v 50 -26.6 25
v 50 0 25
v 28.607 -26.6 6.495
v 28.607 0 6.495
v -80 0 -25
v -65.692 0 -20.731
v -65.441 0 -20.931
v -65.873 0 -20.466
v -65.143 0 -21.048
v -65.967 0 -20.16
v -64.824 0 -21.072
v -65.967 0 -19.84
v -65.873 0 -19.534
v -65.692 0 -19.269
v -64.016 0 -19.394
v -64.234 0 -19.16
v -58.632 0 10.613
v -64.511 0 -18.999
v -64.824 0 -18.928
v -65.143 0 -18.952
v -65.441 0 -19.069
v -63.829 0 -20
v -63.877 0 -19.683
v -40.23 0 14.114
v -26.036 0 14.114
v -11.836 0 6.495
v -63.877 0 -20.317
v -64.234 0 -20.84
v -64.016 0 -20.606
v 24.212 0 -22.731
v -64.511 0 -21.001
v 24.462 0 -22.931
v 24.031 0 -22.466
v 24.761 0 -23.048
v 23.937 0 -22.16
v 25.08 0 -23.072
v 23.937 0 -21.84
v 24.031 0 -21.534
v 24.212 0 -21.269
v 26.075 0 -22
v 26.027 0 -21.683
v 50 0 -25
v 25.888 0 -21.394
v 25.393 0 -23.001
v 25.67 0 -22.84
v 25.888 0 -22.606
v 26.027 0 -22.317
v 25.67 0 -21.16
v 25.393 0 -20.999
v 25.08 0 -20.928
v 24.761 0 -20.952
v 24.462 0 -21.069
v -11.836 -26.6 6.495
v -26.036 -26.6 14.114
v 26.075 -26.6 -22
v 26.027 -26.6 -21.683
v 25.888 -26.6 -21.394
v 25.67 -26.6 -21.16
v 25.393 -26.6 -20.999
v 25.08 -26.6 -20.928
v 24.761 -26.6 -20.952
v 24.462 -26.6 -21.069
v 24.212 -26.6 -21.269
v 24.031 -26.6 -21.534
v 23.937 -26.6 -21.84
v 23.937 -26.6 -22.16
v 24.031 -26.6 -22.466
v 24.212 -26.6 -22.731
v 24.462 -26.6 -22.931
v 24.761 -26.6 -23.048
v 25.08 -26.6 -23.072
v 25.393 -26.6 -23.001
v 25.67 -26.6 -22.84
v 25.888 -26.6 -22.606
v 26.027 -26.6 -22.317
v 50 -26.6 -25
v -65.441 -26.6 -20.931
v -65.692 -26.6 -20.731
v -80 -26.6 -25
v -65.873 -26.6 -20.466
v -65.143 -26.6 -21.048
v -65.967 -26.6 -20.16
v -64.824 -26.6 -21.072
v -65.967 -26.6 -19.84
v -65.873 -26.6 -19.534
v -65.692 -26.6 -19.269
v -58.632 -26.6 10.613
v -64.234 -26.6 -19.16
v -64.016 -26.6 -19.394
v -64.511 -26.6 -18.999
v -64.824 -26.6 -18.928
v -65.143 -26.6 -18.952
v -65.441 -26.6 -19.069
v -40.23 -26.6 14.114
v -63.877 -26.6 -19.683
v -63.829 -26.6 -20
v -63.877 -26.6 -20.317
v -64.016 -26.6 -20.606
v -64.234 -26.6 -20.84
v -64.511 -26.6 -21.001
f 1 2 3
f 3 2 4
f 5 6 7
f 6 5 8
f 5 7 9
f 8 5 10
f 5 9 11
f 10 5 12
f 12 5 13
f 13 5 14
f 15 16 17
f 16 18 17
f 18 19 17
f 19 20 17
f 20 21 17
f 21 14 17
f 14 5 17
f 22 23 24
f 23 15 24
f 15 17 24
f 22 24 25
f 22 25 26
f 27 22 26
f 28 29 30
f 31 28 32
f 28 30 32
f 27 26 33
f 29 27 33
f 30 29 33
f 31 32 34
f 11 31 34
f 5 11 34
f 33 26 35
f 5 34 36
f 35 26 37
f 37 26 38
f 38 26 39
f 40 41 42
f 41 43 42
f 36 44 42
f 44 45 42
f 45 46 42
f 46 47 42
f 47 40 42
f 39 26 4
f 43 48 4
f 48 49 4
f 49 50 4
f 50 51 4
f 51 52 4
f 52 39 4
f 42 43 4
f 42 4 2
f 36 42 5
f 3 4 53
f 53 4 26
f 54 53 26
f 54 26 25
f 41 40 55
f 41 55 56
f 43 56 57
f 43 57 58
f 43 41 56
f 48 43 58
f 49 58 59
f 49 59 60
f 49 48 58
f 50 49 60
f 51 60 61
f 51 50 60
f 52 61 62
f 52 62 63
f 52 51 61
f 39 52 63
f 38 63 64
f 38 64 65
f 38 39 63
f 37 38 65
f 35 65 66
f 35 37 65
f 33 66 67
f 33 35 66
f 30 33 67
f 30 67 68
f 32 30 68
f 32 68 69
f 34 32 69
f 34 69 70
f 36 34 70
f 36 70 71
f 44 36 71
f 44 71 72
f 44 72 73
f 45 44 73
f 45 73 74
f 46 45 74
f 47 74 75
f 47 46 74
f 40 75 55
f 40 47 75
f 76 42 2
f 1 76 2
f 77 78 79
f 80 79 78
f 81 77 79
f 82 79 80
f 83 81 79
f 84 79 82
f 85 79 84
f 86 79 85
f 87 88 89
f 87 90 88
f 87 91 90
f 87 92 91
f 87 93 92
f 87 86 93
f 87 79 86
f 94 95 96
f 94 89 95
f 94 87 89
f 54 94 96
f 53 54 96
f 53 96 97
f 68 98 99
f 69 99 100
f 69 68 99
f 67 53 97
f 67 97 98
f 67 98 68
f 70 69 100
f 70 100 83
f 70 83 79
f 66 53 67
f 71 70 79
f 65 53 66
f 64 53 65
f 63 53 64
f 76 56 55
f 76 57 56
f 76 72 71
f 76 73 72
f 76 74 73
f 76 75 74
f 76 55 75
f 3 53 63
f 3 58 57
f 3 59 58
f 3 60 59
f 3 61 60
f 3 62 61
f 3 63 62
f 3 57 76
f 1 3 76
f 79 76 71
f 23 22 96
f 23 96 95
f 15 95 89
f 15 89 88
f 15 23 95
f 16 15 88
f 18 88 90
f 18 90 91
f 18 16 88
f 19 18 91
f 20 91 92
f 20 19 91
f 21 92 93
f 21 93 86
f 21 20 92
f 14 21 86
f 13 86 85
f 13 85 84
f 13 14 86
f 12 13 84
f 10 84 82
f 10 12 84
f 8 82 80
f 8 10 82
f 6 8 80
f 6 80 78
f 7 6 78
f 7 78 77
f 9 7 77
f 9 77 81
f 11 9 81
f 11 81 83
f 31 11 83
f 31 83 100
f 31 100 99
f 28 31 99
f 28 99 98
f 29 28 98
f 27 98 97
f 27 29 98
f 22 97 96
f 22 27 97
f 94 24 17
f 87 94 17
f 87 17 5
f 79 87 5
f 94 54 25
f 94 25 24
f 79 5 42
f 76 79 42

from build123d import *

# Parameters (mm, degrees)
F0_R     = 1.075
F1_DEPTH = 26.6
F2_DEPTH = 158
F4_DEPTH = 26.601


# Not quite as in the source:
# - an extrude ends at something that could not be found from the text; its depth is read off the source's solid


with BuildPart() as f1:
    # F0 (on Front) → F1 (new body)
    with BuildSketch(Plane.XZ):
        Polygon((50, 25), (-50, 25), (-80, -25), (-50, -25), (25, -25), (50, -25), align=None)
        with Locations((-64.9039745331, -20)):
            Circle(F0_R, mode=Mode.SUBTRACT)
        with Locations((25, -22)):
            Circle(F0_R, mode=Mode.SUBTRACT)
    extrude(amount=F1_DEPTH)

    # F0 (on Front) → F2 (cut, through all)
    with BuildSketch(Plane.XZ):
        with Locations((-64.9039745331, -20)):
            Circle(F0_R)
    extrude(amount=-F2_DEPTH, mode=Mode.SUBTRACT)

    # F3 (on face) → F4 (cut, through all)
    with BuildSketch(Plane(origin=(0, 0, 0), x_dir=(-1, 0, 0), z_dir=(0, 1, 0))):
        Polygon((50, 25), (-50, 25), (-28.6072827876, 6.4954175614), (11.8362475187, 6.4954175614), (26.036022231, 14.1141144559), (40.2304567397, 14.1141144559), (58.63198501, 10.6133583166), align=None)
    extrude(amount=-F4_DEPTH, mode=Mode.SUBTRACT)


solid = f1.part
